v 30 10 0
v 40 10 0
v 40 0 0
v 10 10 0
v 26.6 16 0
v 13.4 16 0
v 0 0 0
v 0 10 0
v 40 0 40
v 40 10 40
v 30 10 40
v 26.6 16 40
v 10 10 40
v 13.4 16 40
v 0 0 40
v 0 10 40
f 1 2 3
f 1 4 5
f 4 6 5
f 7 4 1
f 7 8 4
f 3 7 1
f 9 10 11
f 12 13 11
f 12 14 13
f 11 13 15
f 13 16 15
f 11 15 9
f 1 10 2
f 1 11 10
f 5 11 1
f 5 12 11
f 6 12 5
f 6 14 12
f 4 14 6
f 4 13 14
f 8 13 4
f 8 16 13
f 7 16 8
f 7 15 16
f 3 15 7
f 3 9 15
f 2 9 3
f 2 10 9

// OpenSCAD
$fn = 32;

// ----------------------------------------------------------------------
// V guide rail: dovetail, 40 mm wide
// ----------------------------------------------------------------------

// --- parameters (mm) ---
rail_w = 40;              // rail width, X
base_t = 10;              // base plate thickness
v_depth = 6;              // V feature depth / height
v_half_w = 10;            // half width of the V at the base face
plate_t = 40;             // rail length, Z (the extrusion height)
top_half_w = 6.6;         // half width at the dovetail top
fit_tol = 0.02;           // declared fit tolerance (prompt contract)
free_tol = 0.2;           // declared free tolerance (prompt contract)

dovetail_base = 2 * v_half_w;  // dovetail width at the base
dovetail_top = 2 * top_half_w;  // dovetail width at the top

profile = [[0, 0], [40, 0], [40, 10], [30, 10], [26.6, 16], [13.4, 16], [10, 10], [0, 10]];  // primary outline, 8 points, counter clockwise

// --- the one profile operation ---
linear_extrude(height = plate_t) polygon(points = profile);
